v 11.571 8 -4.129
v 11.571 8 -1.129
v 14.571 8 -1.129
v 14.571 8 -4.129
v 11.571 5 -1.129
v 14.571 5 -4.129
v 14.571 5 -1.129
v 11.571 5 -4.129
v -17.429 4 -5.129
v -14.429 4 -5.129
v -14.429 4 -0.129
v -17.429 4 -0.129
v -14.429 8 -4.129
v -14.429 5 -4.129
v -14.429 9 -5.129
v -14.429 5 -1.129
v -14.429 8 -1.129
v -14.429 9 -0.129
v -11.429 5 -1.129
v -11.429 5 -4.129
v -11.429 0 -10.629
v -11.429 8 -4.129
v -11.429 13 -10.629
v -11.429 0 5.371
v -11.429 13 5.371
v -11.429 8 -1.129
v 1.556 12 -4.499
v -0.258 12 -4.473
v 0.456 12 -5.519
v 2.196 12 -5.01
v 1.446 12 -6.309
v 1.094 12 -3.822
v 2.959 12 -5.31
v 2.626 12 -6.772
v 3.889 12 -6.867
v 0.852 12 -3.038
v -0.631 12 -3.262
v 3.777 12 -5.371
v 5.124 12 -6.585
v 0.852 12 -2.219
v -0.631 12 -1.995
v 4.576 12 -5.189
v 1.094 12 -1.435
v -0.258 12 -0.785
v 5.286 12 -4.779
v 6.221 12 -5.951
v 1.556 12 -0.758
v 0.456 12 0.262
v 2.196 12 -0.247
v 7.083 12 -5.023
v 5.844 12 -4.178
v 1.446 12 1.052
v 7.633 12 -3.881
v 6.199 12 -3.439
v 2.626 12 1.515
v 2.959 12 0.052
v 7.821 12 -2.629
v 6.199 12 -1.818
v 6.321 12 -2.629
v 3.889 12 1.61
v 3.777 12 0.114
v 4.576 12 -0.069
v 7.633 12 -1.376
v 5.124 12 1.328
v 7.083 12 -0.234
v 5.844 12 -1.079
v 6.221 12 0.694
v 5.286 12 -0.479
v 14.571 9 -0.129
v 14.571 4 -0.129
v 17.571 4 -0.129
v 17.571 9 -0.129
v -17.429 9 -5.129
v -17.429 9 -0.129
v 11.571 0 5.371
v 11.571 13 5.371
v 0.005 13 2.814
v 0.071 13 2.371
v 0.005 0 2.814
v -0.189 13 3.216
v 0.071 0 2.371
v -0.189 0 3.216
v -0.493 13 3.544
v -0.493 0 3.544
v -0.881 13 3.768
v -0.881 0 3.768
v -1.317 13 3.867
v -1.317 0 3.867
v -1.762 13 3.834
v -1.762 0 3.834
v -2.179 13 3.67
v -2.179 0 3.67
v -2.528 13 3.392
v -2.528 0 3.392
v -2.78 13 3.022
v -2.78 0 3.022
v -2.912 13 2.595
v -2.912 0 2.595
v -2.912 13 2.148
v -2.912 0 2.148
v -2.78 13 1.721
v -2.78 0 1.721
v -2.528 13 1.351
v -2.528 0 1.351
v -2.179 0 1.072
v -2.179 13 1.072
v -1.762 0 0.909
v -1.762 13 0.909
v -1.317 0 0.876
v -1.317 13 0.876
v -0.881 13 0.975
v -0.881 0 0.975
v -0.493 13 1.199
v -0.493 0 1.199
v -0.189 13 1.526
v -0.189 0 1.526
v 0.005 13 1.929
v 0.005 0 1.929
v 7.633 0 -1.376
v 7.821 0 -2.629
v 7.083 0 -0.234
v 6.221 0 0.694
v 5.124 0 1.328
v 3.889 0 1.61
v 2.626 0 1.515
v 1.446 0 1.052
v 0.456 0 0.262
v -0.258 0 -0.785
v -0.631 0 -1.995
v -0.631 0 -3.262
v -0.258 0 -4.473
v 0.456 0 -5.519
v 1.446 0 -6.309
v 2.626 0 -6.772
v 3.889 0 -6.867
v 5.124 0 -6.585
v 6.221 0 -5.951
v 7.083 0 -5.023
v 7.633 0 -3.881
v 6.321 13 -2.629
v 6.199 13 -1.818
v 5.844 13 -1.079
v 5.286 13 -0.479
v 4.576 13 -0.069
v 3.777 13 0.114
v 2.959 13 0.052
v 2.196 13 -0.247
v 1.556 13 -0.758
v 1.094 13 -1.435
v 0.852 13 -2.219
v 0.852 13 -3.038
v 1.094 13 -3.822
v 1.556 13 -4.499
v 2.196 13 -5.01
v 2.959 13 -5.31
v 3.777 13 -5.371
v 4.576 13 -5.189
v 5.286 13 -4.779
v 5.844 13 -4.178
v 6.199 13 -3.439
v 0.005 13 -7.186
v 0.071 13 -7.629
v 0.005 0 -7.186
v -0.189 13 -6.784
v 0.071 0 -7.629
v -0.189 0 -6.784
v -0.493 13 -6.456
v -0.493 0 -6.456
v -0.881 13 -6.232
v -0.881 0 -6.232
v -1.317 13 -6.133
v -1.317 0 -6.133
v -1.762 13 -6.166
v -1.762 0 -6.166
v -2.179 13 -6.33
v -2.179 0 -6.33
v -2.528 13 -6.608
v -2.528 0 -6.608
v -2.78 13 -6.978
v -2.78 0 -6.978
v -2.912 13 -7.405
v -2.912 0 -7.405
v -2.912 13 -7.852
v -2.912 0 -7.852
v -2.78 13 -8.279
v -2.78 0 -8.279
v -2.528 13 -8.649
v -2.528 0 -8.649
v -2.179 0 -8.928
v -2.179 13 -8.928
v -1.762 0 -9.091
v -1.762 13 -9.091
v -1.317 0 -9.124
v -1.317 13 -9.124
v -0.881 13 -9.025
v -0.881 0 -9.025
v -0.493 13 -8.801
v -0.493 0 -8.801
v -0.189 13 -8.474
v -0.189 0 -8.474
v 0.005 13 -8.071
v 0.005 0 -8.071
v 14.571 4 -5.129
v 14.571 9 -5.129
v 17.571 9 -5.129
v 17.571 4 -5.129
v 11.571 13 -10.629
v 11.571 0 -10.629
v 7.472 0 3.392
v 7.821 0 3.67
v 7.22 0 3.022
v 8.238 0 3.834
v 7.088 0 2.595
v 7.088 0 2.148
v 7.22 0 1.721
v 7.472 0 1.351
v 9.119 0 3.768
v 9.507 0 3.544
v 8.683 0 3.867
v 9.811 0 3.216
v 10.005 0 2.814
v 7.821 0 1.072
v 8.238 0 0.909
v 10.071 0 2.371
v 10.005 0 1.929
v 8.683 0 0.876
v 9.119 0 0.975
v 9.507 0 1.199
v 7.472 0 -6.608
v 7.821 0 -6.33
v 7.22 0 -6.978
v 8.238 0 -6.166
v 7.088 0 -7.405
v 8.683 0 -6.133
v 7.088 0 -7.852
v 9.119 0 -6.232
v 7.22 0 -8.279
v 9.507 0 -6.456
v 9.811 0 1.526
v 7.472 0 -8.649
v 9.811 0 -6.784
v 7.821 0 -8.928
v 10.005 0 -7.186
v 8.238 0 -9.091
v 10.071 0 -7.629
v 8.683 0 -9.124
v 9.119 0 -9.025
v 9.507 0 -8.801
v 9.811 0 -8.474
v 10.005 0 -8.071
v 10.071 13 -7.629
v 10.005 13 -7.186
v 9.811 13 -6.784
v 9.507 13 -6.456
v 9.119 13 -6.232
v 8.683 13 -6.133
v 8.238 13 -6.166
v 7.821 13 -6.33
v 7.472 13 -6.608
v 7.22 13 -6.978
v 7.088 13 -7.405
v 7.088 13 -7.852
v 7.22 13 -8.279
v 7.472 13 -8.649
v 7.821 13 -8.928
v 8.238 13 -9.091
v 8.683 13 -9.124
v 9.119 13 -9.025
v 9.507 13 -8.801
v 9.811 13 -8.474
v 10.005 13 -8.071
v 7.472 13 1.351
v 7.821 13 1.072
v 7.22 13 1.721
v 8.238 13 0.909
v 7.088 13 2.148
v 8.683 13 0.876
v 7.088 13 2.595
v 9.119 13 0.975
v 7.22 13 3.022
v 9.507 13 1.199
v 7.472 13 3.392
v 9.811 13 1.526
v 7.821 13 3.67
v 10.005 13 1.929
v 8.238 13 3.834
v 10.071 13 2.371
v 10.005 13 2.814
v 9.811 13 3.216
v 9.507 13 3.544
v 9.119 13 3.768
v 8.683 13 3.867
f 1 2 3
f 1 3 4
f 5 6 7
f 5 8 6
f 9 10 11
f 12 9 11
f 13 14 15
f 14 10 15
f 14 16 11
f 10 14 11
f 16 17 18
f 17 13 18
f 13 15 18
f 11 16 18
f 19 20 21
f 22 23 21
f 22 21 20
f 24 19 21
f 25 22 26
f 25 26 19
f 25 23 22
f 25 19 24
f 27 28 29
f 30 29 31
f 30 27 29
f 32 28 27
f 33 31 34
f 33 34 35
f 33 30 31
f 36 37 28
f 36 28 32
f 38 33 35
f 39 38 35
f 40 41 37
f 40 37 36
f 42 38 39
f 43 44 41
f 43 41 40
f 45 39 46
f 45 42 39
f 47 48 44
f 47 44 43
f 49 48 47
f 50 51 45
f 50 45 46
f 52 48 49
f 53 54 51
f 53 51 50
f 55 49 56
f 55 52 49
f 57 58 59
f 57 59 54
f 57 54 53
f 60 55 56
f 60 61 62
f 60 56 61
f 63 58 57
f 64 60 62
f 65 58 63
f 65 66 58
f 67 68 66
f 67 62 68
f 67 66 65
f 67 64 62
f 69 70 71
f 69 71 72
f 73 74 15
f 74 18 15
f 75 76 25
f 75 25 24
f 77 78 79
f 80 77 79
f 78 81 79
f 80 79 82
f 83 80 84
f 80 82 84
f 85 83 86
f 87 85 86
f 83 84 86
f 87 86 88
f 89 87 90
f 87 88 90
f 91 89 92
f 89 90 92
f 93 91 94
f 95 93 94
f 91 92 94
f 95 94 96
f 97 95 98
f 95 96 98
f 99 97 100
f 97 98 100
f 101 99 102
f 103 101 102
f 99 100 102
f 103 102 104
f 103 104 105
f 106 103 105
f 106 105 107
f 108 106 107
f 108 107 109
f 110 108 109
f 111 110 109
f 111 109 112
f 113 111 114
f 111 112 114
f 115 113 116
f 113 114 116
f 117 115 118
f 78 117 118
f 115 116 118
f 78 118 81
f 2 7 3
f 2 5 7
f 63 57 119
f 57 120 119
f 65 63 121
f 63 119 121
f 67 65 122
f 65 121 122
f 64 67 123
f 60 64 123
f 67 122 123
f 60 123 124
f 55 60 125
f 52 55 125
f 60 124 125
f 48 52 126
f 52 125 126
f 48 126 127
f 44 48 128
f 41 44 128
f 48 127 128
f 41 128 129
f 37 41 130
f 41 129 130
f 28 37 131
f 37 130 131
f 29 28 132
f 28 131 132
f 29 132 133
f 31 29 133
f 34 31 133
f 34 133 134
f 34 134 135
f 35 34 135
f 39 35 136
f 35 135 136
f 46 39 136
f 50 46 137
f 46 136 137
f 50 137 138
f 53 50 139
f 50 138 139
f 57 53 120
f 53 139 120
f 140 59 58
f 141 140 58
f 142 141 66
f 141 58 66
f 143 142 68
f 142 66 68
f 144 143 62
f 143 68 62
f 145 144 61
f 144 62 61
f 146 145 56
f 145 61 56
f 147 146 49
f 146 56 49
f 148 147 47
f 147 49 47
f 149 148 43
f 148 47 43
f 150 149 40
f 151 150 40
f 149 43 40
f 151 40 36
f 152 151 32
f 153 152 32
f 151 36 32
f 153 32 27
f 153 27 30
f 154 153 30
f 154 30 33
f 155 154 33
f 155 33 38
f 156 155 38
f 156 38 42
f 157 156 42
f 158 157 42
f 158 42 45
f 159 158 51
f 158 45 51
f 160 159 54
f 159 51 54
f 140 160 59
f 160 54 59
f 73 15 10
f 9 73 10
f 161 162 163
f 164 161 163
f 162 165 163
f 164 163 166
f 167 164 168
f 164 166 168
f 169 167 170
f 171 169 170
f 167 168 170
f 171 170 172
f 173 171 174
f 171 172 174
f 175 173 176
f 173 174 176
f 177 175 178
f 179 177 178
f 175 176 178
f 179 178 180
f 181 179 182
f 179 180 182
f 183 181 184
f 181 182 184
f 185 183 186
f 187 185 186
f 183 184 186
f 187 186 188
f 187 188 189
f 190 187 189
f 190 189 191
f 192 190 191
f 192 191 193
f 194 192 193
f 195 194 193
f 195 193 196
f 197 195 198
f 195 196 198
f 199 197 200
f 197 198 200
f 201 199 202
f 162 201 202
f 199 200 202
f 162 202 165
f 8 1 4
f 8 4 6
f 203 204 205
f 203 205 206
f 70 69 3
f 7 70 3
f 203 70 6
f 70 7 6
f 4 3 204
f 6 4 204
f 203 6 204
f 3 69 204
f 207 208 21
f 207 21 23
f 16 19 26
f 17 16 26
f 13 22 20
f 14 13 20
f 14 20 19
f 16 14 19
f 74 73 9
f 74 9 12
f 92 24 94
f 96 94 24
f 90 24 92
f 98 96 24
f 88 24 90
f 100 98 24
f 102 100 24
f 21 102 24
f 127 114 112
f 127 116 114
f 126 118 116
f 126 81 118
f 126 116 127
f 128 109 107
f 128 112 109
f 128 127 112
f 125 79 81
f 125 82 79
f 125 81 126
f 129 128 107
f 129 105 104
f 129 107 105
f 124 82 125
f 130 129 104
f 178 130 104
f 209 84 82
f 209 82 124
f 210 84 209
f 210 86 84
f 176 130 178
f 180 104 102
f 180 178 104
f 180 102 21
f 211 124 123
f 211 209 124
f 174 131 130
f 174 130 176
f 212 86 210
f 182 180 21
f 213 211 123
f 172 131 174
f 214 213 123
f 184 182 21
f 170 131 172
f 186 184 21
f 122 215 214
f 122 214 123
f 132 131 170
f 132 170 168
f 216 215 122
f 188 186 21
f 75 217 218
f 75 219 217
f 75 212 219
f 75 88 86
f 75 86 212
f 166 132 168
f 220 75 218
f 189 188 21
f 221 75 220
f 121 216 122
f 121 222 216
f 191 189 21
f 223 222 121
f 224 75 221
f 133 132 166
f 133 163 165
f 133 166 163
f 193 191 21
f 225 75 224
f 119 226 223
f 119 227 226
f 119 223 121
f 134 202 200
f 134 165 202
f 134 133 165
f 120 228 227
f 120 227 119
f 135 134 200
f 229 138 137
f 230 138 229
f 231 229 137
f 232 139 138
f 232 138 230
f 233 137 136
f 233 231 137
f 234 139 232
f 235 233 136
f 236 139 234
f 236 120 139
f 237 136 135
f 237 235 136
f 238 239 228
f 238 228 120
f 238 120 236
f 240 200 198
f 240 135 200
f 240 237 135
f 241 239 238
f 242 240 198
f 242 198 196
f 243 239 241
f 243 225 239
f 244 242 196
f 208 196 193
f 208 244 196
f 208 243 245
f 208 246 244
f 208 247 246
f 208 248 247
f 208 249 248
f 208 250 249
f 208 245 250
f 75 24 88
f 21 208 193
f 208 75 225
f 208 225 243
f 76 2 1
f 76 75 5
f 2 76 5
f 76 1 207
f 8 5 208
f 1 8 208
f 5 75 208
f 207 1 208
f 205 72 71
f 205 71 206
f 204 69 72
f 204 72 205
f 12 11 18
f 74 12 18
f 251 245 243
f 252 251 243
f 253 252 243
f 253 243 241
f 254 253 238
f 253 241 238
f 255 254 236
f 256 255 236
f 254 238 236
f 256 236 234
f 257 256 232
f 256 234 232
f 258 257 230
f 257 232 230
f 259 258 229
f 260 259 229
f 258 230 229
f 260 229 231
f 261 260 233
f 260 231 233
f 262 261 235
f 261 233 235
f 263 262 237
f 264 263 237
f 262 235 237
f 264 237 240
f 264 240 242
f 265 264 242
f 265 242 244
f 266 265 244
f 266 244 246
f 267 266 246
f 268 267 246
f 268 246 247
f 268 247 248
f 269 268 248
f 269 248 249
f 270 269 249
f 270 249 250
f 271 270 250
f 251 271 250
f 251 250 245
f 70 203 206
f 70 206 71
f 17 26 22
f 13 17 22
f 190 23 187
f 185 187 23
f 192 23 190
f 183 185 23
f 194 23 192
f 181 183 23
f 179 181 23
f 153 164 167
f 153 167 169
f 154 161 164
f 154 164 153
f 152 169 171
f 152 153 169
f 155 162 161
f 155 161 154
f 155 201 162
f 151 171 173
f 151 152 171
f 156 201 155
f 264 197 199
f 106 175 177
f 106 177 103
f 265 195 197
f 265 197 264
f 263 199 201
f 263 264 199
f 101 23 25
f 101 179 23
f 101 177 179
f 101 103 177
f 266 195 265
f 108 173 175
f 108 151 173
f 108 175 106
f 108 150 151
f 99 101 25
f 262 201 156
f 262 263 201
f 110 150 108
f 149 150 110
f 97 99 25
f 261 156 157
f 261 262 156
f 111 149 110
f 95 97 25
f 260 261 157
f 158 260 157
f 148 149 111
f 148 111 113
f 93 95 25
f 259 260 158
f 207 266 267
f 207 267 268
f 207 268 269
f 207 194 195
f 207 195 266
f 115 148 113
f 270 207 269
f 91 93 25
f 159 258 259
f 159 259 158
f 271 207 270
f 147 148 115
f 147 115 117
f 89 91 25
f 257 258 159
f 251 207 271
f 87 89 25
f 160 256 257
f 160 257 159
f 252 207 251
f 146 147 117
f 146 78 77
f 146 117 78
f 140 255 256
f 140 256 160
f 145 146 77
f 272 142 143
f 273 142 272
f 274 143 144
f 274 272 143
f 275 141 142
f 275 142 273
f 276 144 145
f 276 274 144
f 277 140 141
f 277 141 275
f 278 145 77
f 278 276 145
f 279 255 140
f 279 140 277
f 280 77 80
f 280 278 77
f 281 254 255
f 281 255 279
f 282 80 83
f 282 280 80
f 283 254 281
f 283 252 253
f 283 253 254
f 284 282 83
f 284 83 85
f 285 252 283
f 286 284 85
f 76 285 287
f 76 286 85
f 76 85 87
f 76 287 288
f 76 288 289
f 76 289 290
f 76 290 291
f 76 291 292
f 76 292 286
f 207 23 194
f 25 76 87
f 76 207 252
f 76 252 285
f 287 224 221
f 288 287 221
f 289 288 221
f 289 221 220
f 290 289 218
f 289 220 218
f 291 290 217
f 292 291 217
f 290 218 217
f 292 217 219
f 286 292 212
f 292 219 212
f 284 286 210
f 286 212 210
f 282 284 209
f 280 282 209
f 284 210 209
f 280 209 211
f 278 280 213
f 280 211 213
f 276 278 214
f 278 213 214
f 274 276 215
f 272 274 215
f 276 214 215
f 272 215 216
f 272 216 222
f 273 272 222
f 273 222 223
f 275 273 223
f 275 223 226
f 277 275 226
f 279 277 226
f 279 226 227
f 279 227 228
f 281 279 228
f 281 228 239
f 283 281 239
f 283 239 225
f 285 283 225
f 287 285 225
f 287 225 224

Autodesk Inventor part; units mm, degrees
ref_plane "YZ Plane" through (0, 0, 0) normal (1, 0, 0) x (0, 1, 0)
ref_plane "XZ Plane" through (0, 0, 0) normal (0, 1, 0) x (-1, 0, 0)
ref_plane "XY Plane" through (0, 0, 0) normal (0, 0, 1) x (1, 0, 0)
sketch "Esquisse1" plane through (0, 0, 0) normal (0, 1, 0) x (-1, 0, 0)
  line L0 (4.4286, 5.3714) -> (-11.5714, 5.3714)
  line L1 (-11.5714, 5.3714) -> (-11.5714, -10.6286)
  line L2 (-11.5714, -10.6286) -> (4.4286, -10.6286)
  line L3 (4.4286, -10.6286) -> (4.4286, 5.3714)
  point P0 (0, 0)
  dimension "d0" = 16
  dimension "d1" = 16
extrude "Extrusion1" add sketch "Esquisse1" along normal blind 13
sketch "Esquisse2" plane through (0, 0, 0) normal (0, -1, 0) x (1, 0, 0)
  circle A0 centre (3.5714, -2.6286) radius 4.25
  line L0 (-4.4286, 5.3714) -> (11.5714, 5.3714) projected
  line L1 (11.5714, 5.3714) -> (11.5714, -10.6286) projected
  point P0 (0, 0)
  dimension "d4" = 8
  dimension "d5" = 8
  dimension "d6" = 8.5
extrude "Extrusion2" cut sketch "Esquisse2" against normal blind 12
sketch "Esquisse3" plane through (3.5714, 12, -2.6286) normal (0, -1, 0) x (1, 0, 0)
  circle A0 centre (0, 0) radius 2.75
  line L0 (8, -8) -> (-8, -8) projected
  line L1 (8, 8) -> (8, -8) projected
  point P0 (-3.5714, 2.6286)
  dimension "d9" = 5.5
  dimension "d10" = 8
  dimension "d11" = 8
extrude "Extrusion3" cut sketch "Esquisse3" against normal through all
sketch "Esquisse4" plane through (0, 0, 0) normal (0, -1, 0) x (1, 0, 0)
  circle A0 centre (8.5714, 2.3714) radius 1.5
  circle A1 centre (-1.4286, 2.3714) radius 1.5
  circle A2 centre (-1.4286, -7.6286) radius 1.5
  circle A3 centre (8.5714, -7.6286) radius 1.5
  line L0 (-4.4286, -10.6286) -> (-4.4286, 5.3714) projected
  line L1 (-4.4286, 5.3714) -> (11.5714, 5.3714) projected
  line L2 (11.5714, 5.3714) -> (11.5714, -10.6286) projected
  line L3 (11.5714, -10.6286) -> (-4.4286, -10.6286) projected
  point P0 (0, 0)
  dimension "d14" = 3
  dimension "d15" = 3
  dimension "d16" = 3
  dimension "d17" = 3
  dimension "d19" = 3
  dimension "d20" = 3
  dimension "d21" = 3
  dimension "d22" = 3
  dimension "d23" = 3
  dimension "d24" = 3
  dimension "d25" = 3
  dimension "d26" = 3
extrude "Extrusion4" cut sketch "Esquisse4" against normal through all contours A0 | A1 | A2 | A3
sketch "Esquisse6" plane through (11.5714, 0, 5.3714) normal (1, 0, 0) x (0, 0, -1)
  line L0 (6.5, 8) -> (9.5, 8)
  line L1 (9.5, 8) -> (9.5, 5)
  line L2 (9.5, 5) -> (6.5, 5)
  line L3 (6.5, 5) -> (6.5, 8)
  line L4 (0, 0) -> (0, 13) projected
  line L5 (0, 13) -> (16, 13) projected
  point P0 (5.3714, 0)
  dimension "d29" = 3
  dimension "d30" = 3
  dimension "d31" = 6.5
  dimension "d32" = 5
extrude "Extrusion5" add sketch "Esquisse6" along normal blind 3
sketch "Esquisse7" plane through (14.5714, 0, 5.3714) normal (1, 0, 0) x (0, 0, -1)
  line L0 (5.5, 9) -> (10.5, 9)
  line L1 (10.5, 9) -> (10.5, 4)
  line L2 (10.5, 4) -> (5.5, 4)
  line L3 (5.5, 4) -> (5.5, 9)
  line L4 (0, 13) -> (16, 13) projected
  line L5 (0, 0) -> (0, 13) projected
  point P0 (5.3714, 0)
  dimension "d35" = 5
  dimension "d36" = 5
  dimension "d37" = 4
  dimension "d38" = 5.5
extrude "Extrusion6" add sketch "Esquisse7" along normal blind 3
sketch "Esquisse8" plane through (-4.4286, 0, -10.6286) normal (-1, 0, 0) x (0, 0, 1)
  line L0 (0, 0) -> (0, 13) projected
  line L1 (0, 13) -> (16, 13)
  line L2 (16, 13) -> (16, 0)
  line L3 (16, 0) -> (0, 0)
  line L4 (0, 0) -> (0, 13)
  point P0 (10.6286, 0)
extrude "Extrusion7" add sketch "Esquisse8" along normal blind 7
sketch "Esquisse9" plane through (-11.4286, 0, -10.6286) normal (-1, 0, 0) x (0, 0, 1)
  line L0 (9.5, 8) -> (6.5, 8)
  line L1 (6.5, 8) -> (6.5, 5)
  line L2 (6.5, 5) -> (9.5, 5)
  line L3 (9.5, 5) -> (9.5, 8)
  line L4 (16, 0) -> (16, 13) projected
  line L5 (16, 13) -> (0, 13) projected
  point P0 (10.6286, 0)
  dimension "d43" = 6.5
  dimension "d44" = 5
  dimension "d45" = 3
  dimension "d46" = 3
extrude "Extrusion8" add sketch "Esquisse9" along normal blind 3
sketch "Esquisse10" plane through (-14.4286, 0, -10.6286) normal (-1, 0, 0) x (0, 0, 1)
  line L0 (10.5, 9) -> (5.5, 9)
  line L1 (5.5, 9) -> (5.5, 4)
  line L2 (5.5, 4) -> (10.5, 4)
  line L3 (10.5, 4) -> (10.5, 9)
  line L4 (16, 0) -> (16, 13) projected
  line L5 (0, 0) -> (16, 0) projected
  point P0 (10.6286, 0)
  dimension "d49" = 5.5
  dimension "d50" = 4
  dimension "d51" = 5
  dimension "d52" = 5
extrude "Extrusion9" add sketch "Esquisse10" along normal blind 3
properties part number "capuchon_roulement"
